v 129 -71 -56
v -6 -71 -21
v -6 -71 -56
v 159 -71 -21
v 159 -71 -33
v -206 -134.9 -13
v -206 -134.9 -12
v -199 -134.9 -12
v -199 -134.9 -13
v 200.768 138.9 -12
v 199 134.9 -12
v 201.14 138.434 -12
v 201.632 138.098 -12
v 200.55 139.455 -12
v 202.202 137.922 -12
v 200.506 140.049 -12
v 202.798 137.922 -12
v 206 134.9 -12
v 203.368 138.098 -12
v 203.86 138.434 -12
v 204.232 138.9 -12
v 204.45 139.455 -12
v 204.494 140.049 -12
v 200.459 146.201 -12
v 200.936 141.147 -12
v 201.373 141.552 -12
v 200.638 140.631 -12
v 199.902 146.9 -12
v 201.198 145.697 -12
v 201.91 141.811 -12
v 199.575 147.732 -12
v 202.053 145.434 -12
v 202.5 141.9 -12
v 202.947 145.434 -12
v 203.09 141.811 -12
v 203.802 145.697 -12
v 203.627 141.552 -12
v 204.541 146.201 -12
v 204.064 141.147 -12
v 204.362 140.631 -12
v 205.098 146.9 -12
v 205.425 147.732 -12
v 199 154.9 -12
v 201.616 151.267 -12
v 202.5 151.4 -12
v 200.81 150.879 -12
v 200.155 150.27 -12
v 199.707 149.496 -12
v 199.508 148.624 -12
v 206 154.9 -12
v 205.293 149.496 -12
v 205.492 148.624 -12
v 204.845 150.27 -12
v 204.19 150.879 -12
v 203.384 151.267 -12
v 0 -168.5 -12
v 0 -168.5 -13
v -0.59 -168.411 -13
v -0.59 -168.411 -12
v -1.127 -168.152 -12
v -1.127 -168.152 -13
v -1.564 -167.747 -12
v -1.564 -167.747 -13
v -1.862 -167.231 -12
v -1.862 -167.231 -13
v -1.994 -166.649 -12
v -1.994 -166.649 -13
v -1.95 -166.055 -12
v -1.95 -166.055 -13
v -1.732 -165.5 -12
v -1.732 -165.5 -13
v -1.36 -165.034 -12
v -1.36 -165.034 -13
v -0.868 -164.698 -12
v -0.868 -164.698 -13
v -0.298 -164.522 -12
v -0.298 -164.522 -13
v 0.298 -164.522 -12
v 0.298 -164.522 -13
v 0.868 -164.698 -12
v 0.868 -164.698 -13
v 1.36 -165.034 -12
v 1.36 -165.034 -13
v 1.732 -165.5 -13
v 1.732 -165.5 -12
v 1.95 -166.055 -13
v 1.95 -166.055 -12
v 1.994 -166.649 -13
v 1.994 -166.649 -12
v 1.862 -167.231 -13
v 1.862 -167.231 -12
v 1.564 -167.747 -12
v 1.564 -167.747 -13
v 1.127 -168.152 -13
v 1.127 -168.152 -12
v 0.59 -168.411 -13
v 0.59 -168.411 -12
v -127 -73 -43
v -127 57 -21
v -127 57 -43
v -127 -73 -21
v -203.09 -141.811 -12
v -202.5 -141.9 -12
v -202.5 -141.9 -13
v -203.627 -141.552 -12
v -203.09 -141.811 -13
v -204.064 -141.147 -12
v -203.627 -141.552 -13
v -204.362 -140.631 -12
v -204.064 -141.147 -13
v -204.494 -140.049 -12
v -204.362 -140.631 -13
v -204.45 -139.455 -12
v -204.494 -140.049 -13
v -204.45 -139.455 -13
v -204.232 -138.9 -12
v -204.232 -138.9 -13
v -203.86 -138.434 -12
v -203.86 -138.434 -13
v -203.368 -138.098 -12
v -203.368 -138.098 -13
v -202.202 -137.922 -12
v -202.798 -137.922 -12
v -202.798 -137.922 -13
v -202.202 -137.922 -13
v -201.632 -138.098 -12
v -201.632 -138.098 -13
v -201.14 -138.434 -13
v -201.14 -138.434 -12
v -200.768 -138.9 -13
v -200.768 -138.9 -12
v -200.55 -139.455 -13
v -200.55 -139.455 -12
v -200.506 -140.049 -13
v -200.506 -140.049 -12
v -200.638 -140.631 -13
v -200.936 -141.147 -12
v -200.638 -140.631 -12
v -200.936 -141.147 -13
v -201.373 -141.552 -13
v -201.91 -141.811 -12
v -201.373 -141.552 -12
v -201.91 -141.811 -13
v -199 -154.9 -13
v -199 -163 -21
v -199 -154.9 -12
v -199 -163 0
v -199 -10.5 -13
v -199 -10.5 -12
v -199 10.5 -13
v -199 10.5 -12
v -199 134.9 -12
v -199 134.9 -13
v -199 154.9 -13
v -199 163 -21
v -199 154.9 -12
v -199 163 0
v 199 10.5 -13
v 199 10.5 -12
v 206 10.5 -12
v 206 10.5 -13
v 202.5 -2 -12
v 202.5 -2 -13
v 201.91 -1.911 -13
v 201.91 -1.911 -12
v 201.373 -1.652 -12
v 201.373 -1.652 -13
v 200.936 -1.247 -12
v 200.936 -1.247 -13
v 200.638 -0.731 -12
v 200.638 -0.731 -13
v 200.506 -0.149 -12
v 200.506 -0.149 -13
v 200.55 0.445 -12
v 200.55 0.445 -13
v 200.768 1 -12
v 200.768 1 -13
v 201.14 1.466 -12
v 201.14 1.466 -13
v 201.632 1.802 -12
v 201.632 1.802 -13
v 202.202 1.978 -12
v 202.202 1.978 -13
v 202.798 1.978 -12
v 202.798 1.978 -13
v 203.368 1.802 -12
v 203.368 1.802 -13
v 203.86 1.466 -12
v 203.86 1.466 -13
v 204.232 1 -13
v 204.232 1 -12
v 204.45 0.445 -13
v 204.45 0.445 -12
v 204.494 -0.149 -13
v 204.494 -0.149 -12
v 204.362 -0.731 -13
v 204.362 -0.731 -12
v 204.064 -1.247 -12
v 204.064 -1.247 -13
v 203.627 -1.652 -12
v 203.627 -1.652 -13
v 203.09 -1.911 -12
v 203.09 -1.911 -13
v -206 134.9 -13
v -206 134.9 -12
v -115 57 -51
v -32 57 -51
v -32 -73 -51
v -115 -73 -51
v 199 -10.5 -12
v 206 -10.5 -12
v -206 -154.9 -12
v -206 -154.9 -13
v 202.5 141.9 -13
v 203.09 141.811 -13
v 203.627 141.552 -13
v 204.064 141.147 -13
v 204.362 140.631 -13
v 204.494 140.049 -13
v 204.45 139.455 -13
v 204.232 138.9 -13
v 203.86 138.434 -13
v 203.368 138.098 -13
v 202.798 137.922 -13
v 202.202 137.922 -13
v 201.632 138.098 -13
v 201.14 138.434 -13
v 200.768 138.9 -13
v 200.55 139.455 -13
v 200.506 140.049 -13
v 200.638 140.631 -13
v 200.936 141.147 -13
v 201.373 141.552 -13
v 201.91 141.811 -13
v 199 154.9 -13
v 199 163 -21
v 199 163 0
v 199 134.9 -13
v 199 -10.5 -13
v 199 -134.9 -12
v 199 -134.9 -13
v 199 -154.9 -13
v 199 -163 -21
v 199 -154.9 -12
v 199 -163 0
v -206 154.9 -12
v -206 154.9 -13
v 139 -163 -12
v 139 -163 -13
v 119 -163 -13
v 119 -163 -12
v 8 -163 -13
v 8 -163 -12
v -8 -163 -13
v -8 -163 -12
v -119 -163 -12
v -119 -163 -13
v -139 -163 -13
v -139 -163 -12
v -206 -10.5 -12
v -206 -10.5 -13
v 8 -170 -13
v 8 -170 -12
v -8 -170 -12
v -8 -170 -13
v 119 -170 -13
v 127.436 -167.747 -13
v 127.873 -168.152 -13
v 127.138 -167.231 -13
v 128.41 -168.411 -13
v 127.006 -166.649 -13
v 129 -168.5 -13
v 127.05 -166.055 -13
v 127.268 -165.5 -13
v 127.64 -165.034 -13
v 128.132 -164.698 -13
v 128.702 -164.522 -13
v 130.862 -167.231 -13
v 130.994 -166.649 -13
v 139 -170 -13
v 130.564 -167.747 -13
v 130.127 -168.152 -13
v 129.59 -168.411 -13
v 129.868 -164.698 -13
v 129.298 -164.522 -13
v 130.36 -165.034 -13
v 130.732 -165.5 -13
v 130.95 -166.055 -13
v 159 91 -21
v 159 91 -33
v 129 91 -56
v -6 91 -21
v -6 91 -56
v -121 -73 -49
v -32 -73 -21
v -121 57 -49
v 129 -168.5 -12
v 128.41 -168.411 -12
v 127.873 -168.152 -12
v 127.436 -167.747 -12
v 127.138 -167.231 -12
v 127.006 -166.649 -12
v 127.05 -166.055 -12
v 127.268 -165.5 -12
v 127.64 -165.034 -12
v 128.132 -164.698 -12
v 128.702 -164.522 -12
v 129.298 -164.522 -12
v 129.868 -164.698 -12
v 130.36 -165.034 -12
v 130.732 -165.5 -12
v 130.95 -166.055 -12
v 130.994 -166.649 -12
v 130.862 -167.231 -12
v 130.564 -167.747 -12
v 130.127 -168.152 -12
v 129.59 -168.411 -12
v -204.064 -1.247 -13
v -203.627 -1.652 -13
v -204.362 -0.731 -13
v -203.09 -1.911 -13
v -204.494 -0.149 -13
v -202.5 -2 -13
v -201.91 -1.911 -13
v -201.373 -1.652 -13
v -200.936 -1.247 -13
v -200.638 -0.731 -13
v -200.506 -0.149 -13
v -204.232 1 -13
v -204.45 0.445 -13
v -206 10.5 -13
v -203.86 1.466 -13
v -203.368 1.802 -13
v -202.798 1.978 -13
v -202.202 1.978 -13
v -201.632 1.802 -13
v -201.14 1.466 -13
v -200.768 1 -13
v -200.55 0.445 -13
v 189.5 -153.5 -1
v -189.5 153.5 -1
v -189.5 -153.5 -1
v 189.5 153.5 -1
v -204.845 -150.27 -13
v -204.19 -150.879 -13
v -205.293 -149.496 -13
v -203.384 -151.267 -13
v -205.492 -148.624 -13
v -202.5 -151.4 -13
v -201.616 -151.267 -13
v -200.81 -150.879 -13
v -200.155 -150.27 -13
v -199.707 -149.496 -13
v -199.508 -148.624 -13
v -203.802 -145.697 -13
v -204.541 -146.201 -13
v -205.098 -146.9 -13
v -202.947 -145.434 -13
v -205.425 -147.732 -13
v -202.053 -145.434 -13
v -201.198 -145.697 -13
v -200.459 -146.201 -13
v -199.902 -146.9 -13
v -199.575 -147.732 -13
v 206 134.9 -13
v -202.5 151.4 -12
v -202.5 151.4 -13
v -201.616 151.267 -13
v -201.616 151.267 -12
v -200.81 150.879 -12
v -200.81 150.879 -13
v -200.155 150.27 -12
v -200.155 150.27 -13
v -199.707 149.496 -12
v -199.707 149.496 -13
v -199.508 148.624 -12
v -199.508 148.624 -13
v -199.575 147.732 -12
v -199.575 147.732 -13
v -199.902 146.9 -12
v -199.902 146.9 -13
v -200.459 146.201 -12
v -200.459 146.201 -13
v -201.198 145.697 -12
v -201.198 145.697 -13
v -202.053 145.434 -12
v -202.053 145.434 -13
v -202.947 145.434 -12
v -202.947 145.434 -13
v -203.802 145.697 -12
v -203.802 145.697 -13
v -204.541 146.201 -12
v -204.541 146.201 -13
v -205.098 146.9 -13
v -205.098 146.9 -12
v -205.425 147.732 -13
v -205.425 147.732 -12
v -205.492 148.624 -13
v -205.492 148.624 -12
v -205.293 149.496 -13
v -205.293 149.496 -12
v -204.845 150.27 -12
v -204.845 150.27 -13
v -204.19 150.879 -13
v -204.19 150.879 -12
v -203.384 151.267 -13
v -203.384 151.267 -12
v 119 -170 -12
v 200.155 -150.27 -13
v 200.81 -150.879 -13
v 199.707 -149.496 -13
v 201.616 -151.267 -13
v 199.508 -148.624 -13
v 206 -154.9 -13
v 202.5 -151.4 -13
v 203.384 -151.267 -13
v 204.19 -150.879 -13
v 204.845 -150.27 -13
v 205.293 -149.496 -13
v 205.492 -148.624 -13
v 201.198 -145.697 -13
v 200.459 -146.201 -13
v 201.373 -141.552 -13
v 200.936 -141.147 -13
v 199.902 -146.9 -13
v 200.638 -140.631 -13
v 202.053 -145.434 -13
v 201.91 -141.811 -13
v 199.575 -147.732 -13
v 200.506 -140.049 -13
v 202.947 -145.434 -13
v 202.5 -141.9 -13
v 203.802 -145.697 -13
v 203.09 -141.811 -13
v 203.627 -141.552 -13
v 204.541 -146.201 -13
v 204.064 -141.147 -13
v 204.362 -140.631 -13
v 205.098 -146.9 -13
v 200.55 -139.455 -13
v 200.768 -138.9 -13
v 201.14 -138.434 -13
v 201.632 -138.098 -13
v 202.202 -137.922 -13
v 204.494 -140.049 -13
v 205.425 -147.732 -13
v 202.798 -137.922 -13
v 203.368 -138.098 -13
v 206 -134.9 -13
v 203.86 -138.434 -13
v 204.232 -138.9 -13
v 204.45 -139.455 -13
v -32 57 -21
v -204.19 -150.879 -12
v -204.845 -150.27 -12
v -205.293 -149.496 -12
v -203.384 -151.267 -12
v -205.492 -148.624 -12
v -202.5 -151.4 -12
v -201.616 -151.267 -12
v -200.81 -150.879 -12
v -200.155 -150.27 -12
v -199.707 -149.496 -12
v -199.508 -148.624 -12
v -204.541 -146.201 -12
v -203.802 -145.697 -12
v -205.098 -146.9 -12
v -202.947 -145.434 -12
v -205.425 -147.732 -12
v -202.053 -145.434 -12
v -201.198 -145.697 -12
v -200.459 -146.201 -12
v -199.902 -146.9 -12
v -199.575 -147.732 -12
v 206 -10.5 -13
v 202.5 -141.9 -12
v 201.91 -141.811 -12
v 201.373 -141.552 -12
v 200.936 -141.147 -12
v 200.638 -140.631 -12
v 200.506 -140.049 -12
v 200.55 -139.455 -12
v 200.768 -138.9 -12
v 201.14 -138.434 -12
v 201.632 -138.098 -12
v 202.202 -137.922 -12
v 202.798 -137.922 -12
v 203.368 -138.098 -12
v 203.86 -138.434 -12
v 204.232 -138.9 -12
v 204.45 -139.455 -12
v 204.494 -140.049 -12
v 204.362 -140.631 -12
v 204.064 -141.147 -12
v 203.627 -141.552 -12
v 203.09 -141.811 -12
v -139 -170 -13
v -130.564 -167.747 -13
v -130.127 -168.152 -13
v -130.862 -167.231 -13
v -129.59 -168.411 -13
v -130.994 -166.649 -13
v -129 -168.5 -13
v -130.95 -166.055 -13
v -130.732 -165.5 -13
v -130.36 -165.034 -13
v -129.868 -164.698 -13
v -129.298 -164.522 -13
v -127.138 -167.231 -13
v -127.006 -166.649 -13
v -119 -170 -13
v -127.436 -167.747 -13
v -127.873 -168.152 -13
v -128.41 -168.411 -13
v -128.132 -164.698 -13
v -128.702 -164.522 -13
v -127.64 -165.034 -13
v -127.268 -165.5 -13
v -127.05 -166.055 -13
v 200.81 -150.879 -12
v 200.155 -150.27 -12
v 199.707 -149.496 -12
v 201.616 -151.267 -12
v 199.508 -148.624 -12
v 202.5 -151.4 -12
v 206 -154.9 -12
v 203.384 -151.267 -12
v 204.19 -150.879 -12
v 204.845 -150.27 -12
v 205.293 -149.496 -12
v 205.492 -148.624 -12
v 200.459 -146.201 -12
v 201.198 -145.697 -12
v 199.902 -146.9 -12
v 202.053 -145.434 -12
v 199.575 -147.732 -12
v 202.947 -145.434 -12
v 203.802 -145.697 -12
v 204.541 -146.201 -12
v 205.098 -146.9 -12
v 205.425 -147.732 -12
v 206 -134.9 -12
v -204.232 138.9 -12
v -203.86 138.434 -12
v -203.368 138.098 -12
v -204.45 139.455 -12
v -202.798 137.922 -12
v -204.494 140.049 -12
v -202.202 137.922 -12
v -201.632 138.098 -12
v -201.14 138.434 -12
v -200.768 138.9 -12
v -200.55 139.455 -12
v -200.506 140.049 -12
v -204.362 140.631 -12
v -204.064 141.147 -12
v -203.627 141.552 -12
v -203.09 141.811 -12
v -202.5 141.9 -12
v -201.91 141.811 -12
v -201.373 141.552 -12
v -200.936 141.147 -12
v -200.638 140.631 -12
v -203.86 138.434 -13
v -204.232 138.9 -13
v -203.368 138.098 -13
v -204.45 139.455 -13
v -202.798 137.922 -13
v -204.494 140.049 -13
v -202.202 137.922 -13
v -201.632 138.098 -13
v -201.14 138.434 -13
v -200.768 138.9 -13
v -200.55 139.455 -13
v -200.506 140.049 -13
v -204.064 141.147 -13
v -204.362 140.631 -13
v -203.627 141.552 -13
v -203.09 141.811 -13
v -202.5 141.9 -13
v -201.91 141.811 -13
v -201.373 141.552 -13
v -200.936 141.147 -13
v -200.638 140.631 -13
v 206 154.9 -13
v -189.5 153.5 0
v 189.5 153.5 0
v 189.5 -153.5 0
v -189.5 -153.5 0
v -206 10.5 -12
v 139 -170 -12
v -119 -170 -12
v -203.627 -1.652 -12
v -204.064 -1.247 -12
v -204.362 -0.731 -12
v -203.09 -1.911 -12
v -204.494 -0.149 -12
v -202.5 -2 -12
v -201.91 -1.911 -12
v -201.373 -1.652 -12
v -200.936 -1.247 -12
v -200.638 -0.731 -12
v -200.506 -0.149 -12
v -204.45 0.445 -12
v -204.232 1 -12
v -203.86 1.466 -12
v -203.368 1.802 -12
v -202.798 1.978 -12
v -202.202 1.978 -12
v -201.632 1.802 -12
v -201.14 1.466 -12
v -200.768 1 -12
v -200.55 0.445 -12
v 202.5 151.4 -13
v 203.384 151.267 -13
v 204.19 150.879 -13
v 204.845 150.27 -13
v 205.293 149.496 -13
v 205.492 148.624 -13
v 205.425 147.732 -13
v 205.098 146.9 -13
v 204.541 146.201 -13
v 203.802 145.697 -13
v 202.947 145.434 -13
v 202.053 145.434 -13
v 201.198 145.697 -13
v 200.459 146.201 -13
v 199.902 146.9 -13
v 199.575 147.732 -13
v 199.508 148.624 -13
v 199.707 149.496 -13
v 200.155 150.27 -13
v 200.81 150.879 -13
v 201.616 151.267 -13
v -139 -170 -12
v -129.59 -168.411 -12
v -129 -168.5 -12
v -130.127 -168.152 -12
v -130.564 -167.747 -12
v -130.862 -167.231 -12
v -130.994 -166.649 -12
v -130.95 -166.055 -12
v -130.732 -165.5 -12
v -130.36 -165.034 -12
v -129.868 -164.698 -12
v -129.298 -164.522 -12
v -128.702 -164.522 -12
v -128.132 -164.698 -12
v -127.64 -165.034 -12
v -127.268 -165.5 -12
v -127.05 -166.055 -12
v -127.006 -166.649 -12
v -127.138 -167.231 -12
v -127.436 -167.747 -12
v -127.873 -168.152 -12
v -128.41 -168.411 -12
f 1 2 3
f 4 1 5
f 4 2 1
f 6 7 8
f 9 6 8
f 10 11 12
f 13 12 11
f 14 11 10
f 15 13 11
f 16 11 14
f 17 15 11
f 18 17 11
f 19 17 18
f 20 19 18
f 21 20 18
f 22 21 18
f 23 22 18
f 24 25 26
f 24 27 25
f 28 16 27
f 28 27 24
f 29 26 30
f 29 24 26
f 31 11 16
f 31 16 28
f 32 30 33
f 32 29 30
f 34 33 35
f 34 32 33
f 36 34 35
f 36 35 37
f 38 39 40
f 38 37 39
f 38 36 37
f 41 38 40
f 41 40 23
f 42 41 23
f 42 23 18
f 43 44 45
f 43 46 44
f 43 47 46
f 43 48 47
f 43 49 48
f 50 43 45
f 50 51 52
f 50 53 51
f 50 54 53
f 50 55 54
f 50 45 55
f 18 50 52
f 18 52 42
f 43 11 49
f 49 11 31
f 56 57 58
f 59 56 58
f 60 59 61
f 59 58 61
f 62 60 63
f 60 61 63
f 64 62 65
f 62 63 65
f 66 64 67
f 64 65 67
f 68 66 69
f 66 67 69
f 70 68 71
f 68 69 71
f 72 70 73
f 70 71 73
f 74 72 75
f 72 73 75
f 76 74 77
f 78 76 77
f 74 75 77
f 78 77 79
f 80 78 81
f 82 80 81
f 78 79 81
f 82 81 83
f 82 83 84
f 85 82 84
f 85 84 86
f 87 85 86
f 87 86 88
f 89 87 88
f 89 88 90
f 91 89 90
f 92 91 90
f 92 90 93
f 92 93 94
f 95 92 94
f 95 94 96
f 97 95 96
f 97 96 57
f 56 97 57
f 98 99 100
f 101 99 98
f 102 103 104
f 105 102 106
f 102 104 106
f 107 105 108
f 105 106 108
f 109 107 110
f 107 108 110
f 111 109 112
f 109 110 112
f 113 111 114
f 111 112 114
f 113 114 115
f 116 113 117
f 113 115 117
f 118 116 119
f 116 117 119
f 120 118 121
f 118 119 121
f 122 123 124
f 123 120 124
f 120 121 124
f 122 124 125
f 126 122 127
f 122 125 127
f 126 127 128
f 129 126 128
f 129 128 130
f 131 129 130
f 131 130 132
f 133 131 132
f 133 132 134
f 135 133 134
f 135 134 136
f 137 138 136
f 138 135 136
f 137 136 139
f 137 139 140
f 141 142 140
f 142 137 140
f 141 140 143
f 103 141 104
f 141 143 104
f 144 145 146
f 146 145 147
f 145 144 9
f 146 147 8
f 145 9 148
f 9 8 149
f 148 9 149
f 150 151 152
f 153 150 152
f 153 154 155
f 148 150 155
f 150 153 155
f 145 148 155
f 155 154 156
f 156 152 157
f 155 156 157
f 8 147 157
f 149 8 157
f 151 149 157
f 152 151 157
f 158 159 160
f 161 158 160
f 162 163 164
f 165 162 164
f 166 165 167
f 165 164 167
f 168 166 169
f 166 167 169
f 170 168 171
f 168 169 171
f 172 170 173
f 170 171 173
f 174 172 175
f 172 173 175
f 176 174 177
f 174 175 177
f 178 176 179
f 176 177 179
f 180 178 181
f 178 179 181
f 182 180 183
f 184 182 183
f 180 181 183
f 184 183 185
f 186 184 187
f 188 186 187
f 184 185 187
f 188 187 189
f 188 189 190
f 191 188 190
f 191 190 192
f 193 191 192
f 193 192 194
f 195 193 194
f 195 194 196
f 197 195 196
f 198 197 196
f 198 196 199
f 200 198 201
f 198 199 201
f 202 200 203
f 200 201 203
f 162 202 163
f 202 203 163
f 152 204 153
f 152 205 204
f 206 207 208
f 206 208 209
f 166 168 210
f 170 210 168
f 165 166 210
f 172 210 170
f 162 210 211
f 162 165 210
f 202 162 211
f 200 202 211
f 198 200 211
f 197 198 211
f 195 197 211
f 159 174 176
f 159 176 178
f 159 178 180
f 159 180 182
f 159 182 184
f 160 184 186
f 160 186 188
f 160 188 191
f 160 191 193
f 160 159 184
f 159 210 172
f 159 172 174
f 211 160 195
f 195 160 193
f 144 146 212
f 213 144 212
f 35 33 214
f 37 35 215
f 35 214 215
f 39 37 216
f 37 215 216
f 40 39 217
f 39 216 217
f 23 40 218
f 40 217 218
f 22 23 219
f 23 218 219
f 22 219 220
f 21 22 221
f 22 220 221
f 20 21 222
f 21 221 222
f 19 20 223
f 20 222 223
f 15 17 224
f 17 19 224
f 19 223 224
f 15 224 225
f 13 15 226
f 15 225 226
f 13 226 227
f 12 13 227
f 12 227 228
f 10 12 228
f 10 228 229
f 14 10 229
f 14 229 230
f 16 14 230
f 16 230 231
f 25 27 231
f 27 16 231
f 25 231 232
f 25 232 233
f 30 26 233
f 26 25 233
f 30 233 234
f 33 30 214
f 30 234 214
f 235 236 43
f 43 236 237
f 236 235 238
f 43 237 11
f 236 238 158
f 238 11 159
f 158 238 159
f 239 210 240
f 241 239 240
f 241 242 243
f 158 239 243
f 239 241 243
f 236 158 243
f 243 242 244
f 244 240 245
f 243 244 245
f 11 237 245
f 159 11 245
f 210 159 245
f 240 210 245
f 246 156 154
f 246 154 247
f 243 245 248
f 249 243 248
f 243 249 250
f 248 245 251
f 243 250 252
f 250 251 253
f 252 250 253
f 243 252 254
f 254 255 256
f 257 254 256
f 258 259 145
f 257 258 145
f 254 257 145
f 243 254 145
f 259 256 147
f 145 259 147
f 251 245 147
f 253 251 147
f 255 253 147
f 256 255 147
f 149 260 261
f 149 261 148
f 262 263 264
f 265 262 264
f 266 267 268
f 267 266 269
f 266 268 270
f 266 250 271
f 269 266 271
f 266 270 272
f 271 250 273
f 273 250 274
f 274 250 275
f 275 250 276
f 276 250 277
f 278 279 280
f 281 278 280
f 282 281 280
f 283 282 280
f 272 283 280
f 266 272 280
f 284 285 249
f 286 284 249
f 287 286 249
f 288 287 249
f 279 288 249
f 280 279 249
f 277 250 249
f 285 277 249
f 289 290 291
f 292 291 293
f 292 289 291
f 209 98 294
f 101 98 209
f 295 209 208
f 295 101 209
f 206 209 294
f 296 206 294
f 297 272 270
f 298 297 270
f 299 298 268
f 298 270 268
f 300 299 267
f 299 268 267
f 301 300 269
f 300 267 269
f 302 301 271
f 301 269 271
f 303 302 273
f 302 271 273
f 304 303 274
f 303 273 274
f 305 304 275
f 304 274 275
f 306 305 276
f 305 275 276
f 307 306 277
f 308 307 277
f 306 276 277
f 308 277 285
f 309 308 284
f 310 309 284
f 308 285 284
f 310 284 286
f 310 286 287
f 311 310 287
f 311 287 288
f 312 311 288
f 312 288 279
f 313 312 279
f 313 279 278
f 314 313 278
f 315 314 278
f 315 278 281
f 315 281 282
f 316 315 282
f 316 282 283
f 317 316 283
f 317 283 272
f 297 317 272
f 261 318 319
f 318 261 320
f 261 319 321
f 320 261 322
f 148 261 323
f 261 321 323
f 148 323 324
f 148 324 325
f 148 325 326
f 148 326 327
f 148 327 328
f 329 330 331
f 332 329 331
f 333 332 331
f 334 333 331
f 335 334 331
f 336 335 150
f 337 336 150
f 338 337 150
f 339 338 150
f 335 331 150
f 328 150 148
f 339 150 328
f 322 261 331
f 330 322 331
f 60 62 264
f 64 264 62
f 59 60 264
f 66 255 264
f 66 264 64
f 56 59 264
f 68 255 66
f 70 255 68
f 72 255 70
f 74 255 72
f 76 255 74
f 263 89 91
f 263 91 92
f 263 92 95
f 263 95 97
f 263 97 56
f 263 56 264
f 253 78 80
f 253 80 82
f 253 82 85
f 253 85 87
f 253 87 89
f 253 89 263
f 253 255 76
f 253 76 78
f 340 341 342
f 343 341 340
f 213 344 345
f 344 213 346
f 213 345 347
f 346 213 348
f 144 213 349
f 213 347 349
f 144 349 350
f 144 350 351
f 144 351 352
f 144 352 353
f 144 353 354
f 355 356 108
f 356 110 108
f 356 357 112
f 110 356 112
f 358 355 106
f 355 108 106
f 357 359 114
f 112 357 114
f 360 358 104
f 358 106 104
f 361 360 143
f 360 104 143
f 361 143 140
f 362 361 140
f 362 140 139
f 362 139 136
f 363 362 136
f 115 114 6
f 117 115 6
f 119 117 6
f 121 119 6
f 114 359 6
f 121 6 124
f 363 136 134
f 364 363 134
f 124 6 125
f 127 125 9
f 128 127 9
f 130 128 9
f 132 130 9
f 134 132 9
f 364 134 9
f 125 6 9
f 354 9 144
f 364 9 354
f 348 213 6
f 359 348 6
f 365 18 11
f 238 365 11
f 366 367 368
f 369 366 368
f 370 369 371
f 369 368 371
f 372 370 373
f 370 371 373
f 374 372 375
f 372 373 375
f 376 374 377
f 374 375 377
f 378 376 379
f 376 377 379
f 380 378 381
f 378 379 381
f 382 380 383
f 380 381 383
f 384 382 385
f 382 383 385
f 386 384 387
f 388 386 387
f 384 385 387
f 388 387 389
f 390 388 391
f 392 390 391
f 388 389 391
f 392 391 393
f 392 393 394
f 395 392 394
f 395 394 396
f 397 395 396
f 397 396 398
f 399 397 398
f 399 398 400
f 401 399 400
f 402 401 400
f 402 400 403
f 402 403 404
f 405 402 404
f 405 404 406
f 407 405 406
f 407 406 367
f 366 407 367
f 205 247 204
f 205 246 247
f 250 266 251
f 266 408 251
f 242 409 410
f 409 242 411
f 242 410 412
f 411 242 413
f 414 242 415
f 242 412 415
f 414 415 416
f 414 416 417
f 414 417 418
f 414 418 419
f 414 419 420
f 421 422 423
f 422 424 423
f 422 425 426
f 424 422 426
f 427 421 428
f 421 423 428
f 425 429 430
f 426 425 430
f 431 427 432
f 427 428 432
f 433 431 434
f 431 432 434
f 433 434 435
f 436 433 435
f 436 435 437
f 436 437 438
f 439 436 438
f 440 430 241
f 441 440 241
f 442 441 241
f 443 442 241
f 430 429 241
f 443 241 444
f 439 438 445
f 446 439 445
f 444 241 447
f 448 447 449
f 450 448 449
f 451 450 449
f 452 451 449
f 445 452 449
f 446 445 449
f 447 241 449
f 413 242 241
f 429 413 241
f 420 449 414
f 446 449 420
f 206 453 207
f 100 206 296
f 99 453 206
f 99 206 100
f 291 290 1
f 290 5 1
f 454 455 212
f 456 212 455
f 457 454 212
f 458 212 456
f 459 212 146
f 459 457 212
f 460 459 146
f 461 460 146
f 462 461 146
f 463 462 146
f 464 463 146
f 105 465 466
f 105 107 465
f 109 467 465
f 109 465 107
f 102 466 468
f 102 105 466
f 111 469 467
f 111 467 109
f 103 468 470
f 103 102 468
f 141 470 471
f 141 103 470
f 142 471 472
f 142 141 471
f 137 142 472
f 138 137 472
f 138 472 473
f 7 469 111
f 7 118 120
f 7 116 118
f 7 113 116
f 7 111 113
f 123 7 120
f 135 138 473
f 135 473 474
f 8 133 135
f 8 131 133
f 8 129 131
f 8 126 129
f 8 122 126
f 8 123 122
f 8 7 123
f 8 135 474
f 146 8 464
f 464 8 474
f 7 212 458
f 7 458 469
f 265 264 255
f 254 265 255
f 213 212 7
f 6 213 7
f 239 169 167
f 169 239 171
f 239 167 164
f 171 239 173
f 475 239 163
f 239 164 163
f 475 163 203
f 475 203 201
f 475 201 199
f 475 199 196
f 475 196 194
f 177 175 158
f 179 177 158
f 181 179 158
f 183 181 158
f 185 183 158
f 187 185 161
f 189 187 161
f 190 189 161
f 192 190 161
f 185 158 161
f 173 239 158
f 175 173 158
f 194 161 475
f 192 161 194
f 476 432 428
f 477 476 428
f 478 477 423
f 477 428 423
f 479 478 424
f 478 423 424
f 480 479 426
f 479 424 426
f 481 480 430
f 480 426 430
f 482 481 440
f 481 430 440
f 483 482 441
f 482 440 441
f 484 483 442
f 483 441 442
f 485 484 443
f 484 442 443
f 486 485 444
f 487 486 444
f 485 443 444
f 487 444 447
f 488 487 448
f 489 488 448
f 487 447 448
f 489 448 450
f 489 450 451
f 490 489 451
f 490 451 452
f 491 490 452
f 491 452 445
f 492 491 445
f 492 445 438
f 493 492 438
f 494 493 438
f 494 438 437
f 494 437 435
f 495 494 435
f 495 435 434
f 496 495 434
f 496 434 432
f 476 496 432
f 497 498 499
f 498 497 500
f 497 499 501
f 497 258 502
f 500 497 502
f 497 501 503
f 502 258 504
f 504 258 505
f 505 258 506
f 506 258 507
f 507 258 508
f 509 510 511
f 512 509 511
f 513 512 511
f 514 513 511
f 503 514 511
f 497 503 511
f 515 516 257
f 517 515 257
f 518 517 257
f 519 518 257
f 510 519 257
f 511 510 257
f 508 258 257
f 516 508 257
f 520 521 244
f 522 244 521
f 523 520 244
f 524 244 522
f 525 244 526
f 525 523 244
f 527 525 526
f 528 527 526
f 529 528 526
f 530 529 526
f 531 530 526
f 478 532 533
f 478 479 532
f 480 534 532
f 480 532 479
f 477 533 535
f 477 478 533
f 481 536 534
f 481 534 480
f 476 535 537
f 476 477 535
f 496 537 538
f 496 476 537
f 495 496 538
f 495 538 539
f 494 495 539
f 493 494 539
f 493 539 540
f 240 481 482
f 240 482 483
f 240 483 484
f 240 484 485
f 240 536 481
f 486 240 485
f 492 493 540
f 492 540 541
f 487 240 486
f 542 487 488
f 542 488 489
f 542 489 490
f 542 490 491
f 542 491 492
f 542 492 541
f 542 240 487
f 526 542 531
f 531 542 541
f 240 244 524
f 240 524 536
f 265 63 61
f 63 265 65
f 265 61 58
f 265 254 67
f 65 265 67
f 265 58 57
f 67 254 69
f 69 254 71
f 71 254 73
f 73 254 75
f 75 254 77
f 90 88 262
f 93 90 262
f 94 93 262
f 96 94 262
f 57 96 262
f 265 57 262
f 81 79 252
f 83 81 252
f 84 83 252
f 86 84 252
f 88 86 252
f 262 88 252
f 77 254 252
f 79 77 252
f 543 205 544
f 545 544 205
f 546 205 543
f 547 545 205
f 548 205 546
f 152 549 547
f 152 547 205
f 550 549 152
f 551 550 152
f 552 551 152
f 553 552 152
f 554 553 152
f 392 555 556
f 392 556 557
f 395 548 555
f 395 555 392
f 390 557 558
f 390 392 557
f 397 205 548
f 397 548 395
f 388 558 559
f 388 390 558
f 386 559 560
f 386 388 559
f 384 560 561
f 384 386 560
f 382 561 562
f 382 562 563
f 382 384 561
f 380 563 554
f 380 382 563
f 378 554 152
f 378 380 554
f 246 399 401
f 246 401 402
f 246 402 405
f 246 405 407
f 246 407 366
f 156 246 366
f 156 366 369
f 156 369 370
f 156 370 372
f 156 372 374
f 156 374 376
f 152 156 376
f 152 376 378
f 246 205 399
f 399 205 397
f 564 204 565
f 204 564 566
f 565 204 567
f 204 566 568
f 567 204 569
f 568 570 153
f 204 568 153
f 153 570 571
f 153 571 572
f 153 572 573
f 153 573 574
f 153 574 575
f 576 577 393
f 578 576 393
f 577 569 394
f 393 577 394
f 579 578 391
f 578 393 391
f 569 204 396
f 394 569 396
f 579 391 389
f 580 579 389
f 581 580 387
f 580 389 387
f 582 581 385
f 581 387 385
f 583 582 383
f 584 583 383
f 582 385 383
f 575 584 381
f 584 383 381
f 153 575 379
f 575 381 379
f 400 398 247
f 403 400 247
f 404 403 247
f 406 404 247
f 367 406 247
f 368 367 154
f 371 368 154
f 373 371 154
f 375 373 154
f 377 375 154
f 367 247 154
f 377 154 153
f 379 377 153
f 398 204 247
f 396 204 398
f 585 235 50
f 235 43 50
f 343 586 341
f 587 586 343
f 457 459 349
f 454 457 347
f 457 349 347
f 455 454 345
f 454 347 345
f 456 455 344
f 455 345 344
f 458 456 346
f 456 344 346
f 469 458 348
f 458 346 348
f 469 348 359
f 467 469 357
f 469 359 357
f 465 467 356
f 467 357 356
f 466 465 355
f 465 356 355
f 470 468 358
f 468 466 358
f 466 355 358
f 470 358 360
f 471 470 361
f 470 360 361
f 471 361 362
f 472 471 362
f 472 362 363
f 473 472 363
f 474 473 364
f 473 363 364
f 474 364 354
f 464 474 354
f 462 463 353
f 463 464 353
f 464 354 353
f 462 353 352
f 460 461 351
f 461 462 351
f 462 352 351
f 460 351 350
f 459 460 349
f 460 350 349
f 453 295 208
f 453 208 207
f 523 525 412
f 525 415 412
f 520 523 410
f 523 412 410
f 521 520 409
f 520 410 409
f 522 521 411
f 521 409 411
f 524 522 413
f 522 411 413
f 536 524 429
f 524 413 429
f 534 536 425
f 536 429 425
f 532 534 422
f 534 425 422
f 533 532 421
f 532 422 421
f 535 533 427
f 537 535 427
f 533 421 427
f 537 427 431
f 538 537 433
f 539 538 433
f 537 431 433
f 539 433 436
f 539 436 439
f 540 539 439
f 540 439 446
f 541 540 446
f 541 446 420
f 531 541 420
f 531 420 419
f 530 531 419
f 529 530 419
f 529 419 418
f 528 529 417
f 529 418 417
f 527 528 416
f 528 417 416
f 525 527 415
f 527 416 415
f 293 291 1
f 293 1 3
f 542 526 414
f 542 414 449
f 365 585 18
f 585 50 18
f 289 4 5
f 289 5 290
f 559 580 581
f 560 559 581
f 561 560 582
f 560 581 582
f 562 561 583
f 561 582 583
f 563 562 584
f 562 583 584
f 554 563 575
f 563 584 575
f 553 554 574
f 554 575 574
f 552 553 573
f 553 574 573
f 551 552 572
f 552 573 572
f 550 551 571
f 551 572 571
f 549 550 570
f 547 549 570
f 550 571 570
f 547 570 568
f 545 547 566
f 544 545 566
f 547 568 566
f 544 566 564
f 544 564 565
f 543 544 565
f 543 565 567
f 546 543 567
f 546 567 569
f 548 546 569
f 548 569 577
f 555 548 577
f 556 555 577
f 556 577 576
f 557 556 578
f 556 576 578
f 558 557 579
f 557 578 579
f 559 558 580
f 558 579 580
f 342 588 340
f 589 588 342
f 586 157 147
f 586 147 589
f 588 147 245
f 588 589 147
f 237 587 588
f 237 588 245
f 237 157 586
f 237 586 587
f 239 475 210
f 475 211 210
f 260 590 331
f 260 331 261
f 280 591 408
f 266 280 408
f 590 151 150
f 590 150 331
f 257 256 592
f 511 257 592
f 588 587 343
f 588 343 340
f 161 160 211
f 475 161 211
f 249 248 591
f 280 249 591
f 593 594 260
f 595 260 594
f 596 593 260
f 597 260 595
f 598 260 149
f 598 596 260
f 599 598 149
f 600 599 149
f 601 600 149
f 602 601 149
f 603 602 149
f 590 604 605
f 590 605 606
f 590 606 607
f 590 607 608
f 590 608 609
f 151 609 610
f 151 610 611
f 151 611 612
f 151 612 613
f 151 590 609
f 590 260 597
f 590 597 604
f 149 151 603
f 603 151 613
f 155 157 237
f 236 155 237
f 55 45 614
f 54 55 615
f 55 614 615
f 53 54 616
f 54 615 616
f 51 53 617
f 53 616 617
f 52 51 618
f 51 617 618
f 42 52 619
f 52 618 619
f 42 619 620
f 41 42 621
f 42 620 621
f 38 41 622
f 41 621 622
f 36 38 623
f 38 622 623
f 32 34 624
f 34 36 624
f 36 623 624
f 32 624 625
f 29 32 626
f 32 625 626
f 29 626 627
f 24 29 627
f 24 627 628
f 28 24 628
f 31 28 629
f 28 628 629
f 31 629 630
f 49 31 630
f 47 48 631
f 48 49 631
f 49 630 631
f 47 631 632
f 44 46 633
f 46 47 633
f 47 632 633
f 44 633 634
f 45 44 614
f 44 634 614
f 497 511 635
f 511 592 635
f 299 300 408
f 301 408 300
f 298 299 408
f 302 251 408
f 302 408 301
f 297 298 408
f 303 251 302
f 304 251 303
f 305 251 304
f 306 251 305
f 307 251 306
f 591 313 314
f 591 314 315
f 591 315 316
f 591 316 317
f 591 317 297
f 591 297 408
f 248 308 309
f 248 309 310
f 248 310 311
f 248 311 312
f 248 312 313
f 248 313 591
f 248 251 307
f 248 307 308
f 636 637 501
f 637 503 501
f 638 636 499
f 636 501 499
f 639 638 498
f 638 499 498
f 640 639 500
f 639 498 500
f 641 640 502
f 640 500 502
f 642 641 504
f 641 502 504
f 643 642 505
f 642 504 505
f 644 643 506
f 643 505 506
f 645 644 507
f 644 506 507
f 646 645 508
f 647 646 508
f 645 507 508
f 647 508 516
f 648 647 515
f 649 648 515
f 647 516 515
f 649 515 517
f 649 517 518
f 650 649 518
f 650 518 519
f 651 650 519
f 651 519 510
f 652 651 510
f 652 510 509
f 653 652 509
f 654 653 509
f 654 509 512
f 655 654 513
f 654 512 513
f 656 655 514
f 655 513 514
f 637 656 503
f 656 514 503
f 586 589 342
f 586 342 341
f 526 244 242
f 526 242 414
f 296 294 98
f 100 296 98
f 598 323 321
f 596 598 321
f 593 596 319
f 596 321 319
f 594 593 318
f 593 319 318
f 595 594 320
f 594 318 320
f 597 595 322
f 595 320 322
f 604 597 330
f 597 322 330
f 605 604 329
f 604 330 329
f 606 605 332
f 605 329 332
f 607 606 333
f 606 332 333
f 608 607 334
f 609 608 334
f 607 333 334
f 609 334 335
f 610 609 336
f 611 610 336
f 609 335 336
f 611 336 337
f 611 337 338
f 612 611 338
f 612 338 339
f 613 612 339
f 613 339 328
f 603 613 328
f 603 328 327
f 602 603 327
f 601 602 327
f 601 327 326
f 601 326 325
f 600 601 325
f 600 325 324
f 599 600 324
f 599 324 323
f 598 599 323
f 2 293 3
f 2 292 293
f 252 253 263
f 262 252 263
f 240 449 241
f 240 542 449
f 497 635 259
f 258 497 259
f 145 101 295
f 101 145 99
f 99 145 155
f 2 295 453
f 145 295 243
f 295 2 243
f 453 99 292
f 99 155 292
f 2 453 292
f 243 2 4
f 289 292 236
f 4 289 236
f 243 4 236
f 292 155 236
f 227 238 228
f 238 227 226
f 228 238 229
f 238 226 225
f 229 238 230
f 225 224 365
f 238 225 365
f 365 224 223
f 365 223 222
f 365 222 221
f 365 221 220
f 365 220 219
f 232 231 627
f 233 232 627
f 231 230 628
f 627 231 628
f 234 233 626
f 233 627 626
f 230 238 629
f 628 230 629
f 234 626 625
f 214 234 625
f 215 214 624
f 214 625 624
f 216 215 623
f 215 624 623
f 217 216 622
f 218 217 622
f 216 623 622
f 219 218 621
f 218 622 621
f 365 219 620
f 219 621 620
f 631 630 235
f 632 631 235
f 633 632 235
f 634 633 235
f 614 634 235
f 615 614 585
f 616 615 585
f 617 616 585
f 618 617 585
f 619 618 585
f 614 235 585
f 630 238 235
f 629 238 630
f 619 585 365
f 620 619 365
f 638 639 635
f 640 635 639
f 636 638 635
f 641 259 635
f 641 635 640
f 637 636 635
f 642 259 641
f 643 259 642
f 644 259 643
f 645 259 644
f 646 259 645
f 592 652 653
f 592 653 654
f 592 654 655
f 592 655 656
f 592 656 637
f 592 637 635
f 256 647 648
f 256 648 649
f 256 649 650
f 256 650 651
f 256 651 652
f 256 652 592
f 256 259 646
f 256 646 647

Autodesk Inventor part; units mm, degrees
ref_plane "YZ Plane" through (0, 0, 0) normal (1, 0, 0) x (0, 1, 0)
ref_plane "XZ Plane" through (0, 0, 0) normal (0, 1, 0) x (-1, 0, 0)
sketch "Sketch1" plane through (0, 0, 0) normal (0, 0, 1) x (1, 0, 0)
  line L0 (-199, 163) -> (199, 163)
  line L1 (199, 163) -> (199, -163)
  line L2 (199, -163) -> (-199, -163)
  line L3 (-199, -163) -> (-199, 163)
  line L4 (-199, 163) -> (199, -163) construction
  line L5 (199, 163) -> (-199, -163) construction
  point P0 (0, 0)
  dimension "d0" = 398
  dimension "d1" = 326
extrude "Extrusion1" add sketch "Sketch1" against normal blind 21
ref_plane "Work Plane1" through (0, 0, -12) normal (0, 0, 1) x (1, 0, 0)
sketch "Sketch2" plane through (0, 0, -12) normal (0, 0, 1) x (1, 0, 0)
  line L0 (-206, 163) -> (206, 163) construction
  line L1 (206, -170) -> (-206, -170) construction
  line L2 (-206, -170) -> (-206, 163) construction
  line L3 (-206, 163) -> (206, -170) construction
  line L4 (206, 163) -> (-206, -170) construction
  line L5 (-199, -163) -> (199, -163) construction
  line L6 (-199, 163) -> (-199, -163) construction
  line L7 (199, 163) -> (-199, 163) construction
  line L8 (-199, -163) -> (-199, 163) projected
  line L9 (199, 10.5) -> (206, 10.5)
  line L10 (206, 10.5) -> (206, -10.5)
  line L11 (206, -10.5) -> (199, -10.5)
  line L12 (199, -10.5) -> (199, 10.5)
  line L13 (199, 10.5) -> (206, -10.5) construction
  line L14 (206, 10.5) -> (199, -10.5) construction
  line L15 (206, -134.9) -> (199, -134.9)
  line L16 (199, -134.9) -> (199, -154.9)
  line L17 (199, -154.9) -> (206, -154.9)
  line L18 (206, -154.9) -> (206, -134.9)
  line L19 (199, -163) -> (-199, -163) projected
  line L20 (-8, -163) -> (8, -163)
  line L21 (8, -163) -> (8, -170)
  line L22 (8, -170) -> (-8, -170)
  line L23 (-8, -170) -> (-8, -163)
  line L24 (-139, -163) -> (-119, -163)
  line L25 (-119, -163) -> (-119, -170)
  line L26 (-119, -170) -> (-139, -170)
  line L27 (-139, -170) -> (-139, -163)
  line L28 (119, -163) -> (139, -163)
  line L29 (139, -163) -> (139, -170)
  line L30 (139, -170) -> (119, -170)
  line L31 (119, -170) -> (119, -163)
  line L32 (206, 163) -> (206, -170) construction
  line L33 (199, -163) -> (199, 163) projected
  line L34 (-288.4, 0) -> (288.4, 0) projected
  line L35 (0, 229.6) -> (0, -236.6) projected
  line L36 (206, 134.9) -> (199, 134.9)
  line L37 (199, 134.9) -> (199, 154.9)
  line L38 (199, 154.9) -> (206, 154.9)
  line L39 (206, 154.9) -> (206, 134.9)
  line L40 (-199, 10.5) -> (-206, 10.5)
  line L41 (-206, 10.5) -> (-206, -10.5)
  line L42 (-206, -10.5) -> (-199, -10.5)
  line L43 (-199, -10.5) -> (-199, 10.5)
  line L44 (-199, 10.5) -> (-206, -10.5) construction
  line L45 (-206, 10.5) -> (-199, -10.5) construction
  line L46 (-206, -134.9) -> (-199, -134.9)
  line L47 (-199, -134.9) -> (-199, -154.9)
  line L48 (-199, -154.9) -> (-206, -154.9)
  line L49 (-206, -154.9) -> (-206, -134.9)
  line L50 (-199, 134.9) -> (-199, 154.9)
  line L51 (-206, 134.9) -> (-199, 134.9)
  line L52 (-206, 154.9) -> (-206, 134.9)
  line L53 (-199, 154.9) -> (-206, 154.9)
  point P0 (0, 0)
  point P1 (0, -3.5)
  point P2 (202.5, 0)
  point P3 (202.5, 0)
  point P4 (-202.5, 0)
  point P5 (-202.5, 0)
  point P6 (0, -170)
  dimension "d6" = 7
  dimension "d7" = 7
  dimension "d8" = 0
  dimension "d9" = 21
  dimension "d10" = 20
  dimension "d11" = 124.4
  dimension "d12" = 7
  dimension "d13" = 16
  dimension "d14" = 111
  dimension "d15" = 20
  dimension "d16" = 111
  dimension "d17" = 20
extrude "Extrusion2" add sketch "Sketch2" against normal blind 1 contours L51 L52 L53 L8 | L33 L38 L39 L36 | L48 L49 L46 L8 | L19 L25 L26 L27 | L42 L41 L34 L8 | L19 L35 L22 L23 | L34 L41 L40 L8 | L19 L21 L22 L35 | L34 L10 L11 L12 | L12 L9 L10 L34 | L19 L29 L30 L31 | L15 L18 L17 L16
sketch "Sketch3" plane through (0, 0, -12) normal (0, 0, 1) x (1, 0, 0)
  line L0 (-119, -170) -> (-119, -163) projected
  line L1 (8, -170) -> (8, -163) projected
  line L2 (119, -163) -> (119, -170) projected
  point P0 (0, 0)
  point P1 (-202.5, 0)
  point P2 (202.5, 0)
  point P3 (129, -166.5)
  point P4 (0, -166.5)
  point P5 (-129, -166.5)
  point P6 (-119, -166.5)
  point P7 (8, -166.5)
  point P8 (119, -166.5)
hole "Hole1" at (-202.5, 0, -12) at (202.5, 0, -12) at (129, -166.5, -12) at (0, -166.5, -12) at (-129, -166.5, -12) direction (0, 0, -1) diameter 4 end through all
sketch "Sketch4" plane through (0, 0, -12) normal (0, 0, 1) x (1, 0, 0)
  line L0 (206, -134.9) -> (199, -134.9) projected
  point P0 (0, 0)
  point P1 (202.5, -139.9)
  dimension "d27" = 5
hole "Hole2" at (202.5, -139.9, -12) direction (0, 0, -1) diameter 4 end through all
sketch "Sketch5" plane through (0, 0, -12) normal (0, 0, 1) x (1, 0, 0)
  line L0 (199, -154.9) -> (206, -154.9) projected
  point P0 (0, 0)
  point P1 (202.5, -148.4)
  point P2 (202.5, -154.9)
  dimension "d35" = 6.5
hole "Hole3" at (202.5, -148.4, -12) direction (0, 0, -1) diameter 6 end through all
mirror "Mirror1" about plane through (0, 0, 0) normal (0, 1, 0) of "Hole2", "Hole3"
mirror "Mirror2" about plane through (0, 0, 0) normal (1, 0, 0) of "Hole2", "Hole3", "Mirror1"
sketch "Sketch6" plane through (0, 0, 0) normal (0, 0, 1) x (1, 0, 0)
  line L0 (-199, -163) -> (199, -163) projected
  line L1 (199, -163) -> (199, 163) projected
  line L2 (199, 163) -> (-199, 163) projected
  line L3 (-199, 163) -> (-199, -163) projected
  line L4 (-189.5, 153.5) -> (189.5, 153.5)
  line L5 (189.5, 153.5) -> (189.5, -153.5)
  line L6 (189.5, -153.5) -> (-189.5, -153.5)
  line L7 (-189.5, -153.5) -> (-189.5, 153.5)
  point P0 (0, 0)
  dimension "d43" = 9.5
extrude "Extrusion3" cut sketch "Sketch6" against normal blind 1 contours L4 L5 L6 L7
sketch "Sketch7" plane through (0, 0, -21) normal (0, 0, -1) x (-1, 0, 0)
  line L0 (32, 57) -> (127, 57)
  line L1 (127, 57) -> (127, -73)
  line L2 (127, -73) -> (32, -73)
  line L3 (32, -73) -> (32, 57)
  line L4 (199, -163) -> (199, 163) projected
  line L5 (-199, -163) -> (199, -163) projected
  point P0 (0, 0)
  dimension "d46" = 72
  dimension "d47" = 90
  dimension "d48" = 95
  dimension "d49" = 130
extrude "Extrusion4" add sketch "Sketch7" along normal blind 30
sketch "Sketch8" plane through (0, 0, -21) normal (0, 0, -1) x (-1, 0, 0)
  line L0 (-159, 91) -> (6, 91)
  line L1 (6, 91) -> (6, -71)
  line L2 (6, -71) -> (-159, -71)
  line L3 (-159, -71) -> (-159, 91)
  line L4 (-199, -163) -> (199, -163) projected
  line L5 (-199, 163) -> (-199, -163) projected
  point P0 (0, 0)
  dimension "d52" = 92
  dimension "d53" = 40
  dimension "d54" = 165
  dimension "d55" = 162
extrude "Extrusion5" add sketch "Sketch8" along normal blind 35
sketch "Sketch9" plane through (-6, -71, -21) normal (0, -1, 0) x (1, 0, 0)
  line L0 (0, 0) -> (165, 0) projected
  line L1 (0, 0) -> (0, -35) projected
  line L2 (165, -35) -> (0, -35) projected
  line L3 (165, 0) -> (165, -35) projected
  line L4 (165, 0) -> (165, -35) projected
  line L5 (165, -12) -> (135, -35)
  line L6 (165, -35) -> (0, -35) projected
  point P0 (6, 21)
  dimension "d58" = 23
  dimension "d59" = 30
extrude "Extrusion6" cut sketch "Sketch9" against normal through all contours L3 L2 L5
sketch "Sketch10" plane through (-127, -73, -21) normal (0, -1, 0) x (1, 0, 0)
  line L0 (0, 0) -> (95, 0) projected
  line L1 (0, 0) -> (0, -30) projected
  line L2 (95, -30) -> (0, -30) projected
  line L3 (95, 0) -> (95, -30) projected
  line L4 (95, -30) -> (0, -30) projected
  line L5 (12, -30) -> (6, -28)
  line L6 (6, -28) -> (0, -22)
  line L7 (0, 0) -> (0, -30) projected
  point P0 (127, 21)
  point P1 (0, -22)
  dimension "d62" = 6
  dimension "d63" = 12
  dimension "d64" = 2
  dimension "d65" = 8
extrude "Extrusion7" cut sketch "Sketch10" against normal through all contours L6 L5 L2 L1
properties part number "skærm"
